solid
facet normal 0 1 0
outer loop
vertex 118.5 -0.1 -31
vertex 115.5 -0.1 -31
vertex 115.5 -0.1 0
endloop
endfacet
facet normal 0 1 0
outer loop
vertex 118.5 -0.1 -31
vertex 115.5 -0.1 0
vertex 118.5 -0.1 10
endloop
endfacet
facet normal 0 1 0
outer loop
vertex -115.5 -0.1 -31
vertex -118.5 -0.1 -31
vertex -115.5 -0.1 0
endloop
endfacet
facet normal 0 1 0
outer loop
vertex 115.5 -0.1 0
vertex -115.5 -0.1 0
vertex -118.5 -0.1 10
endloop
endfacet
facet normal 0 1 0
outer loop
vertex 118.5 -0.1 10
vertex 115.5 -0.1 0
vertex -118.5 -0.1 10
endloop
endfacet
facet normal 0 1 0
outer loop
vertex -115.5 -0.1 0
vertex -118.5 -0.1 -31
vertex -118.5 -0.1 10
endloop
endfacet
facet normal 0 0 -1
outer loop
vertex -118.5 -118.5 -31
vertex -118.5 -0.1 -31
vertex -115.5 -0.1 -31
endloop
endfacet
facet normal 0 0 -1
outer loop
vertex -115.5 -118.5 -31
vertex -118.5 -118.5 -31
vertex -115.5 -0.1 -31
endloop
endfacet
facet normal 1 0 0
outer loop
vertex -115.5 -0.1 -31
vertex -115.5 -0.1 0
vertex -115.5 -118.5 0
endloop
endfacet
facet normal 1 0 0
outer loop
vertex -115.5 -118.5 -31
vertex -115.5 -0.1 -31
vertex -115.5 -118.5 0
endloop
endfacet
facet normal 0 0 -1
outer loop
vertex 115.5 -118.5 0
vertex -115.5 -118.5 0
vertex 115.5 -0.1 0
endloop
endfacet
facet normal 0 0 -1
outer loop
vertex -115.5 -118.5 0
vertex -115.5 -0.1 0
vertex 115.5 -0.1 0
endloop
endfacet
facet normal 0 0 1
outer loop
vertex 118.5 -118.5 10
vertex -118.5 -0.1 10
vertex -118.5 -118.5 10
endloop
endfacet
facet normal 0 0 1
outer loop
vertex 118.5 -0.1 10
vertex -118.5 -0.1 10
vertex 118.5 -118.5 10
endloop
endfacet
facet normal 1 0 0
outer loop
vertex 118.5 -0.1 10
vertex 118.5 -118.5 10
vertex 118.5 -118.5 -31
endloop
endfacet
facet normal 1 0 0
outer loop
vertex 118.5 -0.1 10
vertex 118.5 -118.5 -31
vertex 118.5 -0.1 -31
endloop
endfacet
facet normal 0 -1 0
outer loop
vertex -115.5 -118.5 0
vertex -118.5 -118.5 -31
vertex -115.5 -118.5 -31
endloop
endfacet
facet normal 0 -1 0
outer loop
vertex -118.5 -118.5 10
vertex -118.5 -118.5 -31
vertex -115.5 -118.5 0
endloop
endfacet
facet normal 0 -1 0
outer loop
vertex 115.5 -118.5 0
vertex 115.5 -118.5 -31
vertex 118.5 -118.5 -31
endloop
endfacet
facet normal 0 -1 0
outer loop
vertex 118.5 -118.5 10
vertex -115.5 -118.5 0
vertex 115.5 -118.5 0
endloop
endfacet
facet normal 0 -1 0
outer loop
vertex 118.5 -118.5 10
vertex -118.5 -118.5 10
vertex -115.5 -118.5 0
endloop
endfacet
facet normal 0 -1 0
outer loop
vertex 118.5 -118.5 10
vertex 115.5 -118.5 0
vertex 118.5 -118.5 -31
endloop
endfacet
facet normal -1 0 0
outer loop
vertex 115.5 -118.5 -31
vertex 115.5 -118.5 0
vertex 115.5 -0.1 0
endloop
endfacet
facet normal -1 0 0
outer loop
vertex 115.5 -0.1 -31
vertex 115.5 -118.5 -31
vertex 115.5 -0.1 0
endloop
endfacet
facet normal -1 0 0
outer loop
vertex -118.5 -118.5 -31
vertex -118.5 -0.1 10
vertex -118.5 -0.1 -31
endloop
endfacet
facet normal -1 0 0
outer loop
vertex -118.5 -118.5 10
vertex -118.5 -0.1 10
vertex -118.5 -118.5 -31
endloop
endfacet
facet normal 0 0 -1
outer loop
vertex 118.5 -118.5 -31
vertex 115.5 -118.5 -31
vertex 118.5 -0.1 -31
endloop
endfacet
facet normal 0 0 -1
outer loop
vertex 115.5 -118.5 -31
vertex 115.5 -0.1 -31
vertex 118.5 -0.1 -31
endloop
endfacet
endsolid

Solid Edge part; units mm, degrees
sketch "Sketch1" plane through (0, 0, 0) normal (0, 0, 1) x (1, 0, 0)
  line L0 (-115.5, -115.5) -> (115.5, -115.5)
  line L1 (115.5, -115.5) -> (115.5, 87.5)
  line L2 (115.5, 87.5) -> (87.5, 115.5)
  line L3 (87.5, 115.5) -> (-87.5, 115.5)
  line L4 (-87.5, 115.5) -> (-115.5, 87.5)
  line L5 (-115.5, 87.5) -> (-115.5, -115.5)
extrude "Protrusion1" add sketch "Sketch1" along normal blind 10
sketch "Sketch2" plane through (0, 0, 10) normal (0, 0, 1) x (1, 0, 0)
  line L0 (88.7426, 118.5) -> (-88.7426, 118.5)
  line L1 (-88.7426, 118.5) -> (-118.5, 88.7426)
  line L2 (-118.5, 88.7426) -> (-118.5, -118.5)
  line L3 (-118.5, -118.5) -> (118.5, -118.5)
  line L4 (118.5, -118.5) -> (118.5, 88.7426)
  line L5 (118.5, 88.7426) -> (88.7426, 118.5)
  line L6 (87.5, 115.5) -> (-87.5, 115.5)
  line L7 (-87.5, 115.5) -> (-115.5, 87.5)
  line L8 (-115.5, 87.5) -> (-115.5, -115.5)
  line L9 (-115.5, -115.5) -> (115.5, -115.5)
  line L10 (115.5, -115.5) -> (115.5, 87.5)
  line L11 (115.5, 87.5) -> (87.5, 115.5)
  dimension "D1" = 3
  dimension "D2" = 3
extrude "Protrusion2" add sketch "Sketch2" against normal blind 41
sketch "Sketch3" plane through (-118.5, -14.8787, -10.5) normal (-1, 0, 0) x (0, -1, 0)
  line L0 (-133.3787, -20.5) -> (-14.7787, -20.5)
  line L1 (-14.7787, -20.5) -> (-14.7787, 20.5)
  line L2 (-14.7787, 20.5) -> (-133.3787, 20.5)
  line L3 (-133.3787, 20.5) -> (-133.3787, -20.5)
extrude "Cutout1" cut sketch "Sketch3" against normal blind 400
sketch "Sketch4" plane through (0, -115.5, -15.5) normal (0, 1, 0) x (-1, 0, 0)
  line L0 (-115.5, -15.5) -> (115.5, -15.5)
  line L1 (115.5, -15.5) -> (115.5, 15.5)
  line L2 (115.5, 15.5) -> (-115.5, 15.5)
  line L3 (-115.5, 15.5) -> (-115.5, -15.5)
extrude "Cutout2" cut sketch "Sketch4" against normal blind 70
